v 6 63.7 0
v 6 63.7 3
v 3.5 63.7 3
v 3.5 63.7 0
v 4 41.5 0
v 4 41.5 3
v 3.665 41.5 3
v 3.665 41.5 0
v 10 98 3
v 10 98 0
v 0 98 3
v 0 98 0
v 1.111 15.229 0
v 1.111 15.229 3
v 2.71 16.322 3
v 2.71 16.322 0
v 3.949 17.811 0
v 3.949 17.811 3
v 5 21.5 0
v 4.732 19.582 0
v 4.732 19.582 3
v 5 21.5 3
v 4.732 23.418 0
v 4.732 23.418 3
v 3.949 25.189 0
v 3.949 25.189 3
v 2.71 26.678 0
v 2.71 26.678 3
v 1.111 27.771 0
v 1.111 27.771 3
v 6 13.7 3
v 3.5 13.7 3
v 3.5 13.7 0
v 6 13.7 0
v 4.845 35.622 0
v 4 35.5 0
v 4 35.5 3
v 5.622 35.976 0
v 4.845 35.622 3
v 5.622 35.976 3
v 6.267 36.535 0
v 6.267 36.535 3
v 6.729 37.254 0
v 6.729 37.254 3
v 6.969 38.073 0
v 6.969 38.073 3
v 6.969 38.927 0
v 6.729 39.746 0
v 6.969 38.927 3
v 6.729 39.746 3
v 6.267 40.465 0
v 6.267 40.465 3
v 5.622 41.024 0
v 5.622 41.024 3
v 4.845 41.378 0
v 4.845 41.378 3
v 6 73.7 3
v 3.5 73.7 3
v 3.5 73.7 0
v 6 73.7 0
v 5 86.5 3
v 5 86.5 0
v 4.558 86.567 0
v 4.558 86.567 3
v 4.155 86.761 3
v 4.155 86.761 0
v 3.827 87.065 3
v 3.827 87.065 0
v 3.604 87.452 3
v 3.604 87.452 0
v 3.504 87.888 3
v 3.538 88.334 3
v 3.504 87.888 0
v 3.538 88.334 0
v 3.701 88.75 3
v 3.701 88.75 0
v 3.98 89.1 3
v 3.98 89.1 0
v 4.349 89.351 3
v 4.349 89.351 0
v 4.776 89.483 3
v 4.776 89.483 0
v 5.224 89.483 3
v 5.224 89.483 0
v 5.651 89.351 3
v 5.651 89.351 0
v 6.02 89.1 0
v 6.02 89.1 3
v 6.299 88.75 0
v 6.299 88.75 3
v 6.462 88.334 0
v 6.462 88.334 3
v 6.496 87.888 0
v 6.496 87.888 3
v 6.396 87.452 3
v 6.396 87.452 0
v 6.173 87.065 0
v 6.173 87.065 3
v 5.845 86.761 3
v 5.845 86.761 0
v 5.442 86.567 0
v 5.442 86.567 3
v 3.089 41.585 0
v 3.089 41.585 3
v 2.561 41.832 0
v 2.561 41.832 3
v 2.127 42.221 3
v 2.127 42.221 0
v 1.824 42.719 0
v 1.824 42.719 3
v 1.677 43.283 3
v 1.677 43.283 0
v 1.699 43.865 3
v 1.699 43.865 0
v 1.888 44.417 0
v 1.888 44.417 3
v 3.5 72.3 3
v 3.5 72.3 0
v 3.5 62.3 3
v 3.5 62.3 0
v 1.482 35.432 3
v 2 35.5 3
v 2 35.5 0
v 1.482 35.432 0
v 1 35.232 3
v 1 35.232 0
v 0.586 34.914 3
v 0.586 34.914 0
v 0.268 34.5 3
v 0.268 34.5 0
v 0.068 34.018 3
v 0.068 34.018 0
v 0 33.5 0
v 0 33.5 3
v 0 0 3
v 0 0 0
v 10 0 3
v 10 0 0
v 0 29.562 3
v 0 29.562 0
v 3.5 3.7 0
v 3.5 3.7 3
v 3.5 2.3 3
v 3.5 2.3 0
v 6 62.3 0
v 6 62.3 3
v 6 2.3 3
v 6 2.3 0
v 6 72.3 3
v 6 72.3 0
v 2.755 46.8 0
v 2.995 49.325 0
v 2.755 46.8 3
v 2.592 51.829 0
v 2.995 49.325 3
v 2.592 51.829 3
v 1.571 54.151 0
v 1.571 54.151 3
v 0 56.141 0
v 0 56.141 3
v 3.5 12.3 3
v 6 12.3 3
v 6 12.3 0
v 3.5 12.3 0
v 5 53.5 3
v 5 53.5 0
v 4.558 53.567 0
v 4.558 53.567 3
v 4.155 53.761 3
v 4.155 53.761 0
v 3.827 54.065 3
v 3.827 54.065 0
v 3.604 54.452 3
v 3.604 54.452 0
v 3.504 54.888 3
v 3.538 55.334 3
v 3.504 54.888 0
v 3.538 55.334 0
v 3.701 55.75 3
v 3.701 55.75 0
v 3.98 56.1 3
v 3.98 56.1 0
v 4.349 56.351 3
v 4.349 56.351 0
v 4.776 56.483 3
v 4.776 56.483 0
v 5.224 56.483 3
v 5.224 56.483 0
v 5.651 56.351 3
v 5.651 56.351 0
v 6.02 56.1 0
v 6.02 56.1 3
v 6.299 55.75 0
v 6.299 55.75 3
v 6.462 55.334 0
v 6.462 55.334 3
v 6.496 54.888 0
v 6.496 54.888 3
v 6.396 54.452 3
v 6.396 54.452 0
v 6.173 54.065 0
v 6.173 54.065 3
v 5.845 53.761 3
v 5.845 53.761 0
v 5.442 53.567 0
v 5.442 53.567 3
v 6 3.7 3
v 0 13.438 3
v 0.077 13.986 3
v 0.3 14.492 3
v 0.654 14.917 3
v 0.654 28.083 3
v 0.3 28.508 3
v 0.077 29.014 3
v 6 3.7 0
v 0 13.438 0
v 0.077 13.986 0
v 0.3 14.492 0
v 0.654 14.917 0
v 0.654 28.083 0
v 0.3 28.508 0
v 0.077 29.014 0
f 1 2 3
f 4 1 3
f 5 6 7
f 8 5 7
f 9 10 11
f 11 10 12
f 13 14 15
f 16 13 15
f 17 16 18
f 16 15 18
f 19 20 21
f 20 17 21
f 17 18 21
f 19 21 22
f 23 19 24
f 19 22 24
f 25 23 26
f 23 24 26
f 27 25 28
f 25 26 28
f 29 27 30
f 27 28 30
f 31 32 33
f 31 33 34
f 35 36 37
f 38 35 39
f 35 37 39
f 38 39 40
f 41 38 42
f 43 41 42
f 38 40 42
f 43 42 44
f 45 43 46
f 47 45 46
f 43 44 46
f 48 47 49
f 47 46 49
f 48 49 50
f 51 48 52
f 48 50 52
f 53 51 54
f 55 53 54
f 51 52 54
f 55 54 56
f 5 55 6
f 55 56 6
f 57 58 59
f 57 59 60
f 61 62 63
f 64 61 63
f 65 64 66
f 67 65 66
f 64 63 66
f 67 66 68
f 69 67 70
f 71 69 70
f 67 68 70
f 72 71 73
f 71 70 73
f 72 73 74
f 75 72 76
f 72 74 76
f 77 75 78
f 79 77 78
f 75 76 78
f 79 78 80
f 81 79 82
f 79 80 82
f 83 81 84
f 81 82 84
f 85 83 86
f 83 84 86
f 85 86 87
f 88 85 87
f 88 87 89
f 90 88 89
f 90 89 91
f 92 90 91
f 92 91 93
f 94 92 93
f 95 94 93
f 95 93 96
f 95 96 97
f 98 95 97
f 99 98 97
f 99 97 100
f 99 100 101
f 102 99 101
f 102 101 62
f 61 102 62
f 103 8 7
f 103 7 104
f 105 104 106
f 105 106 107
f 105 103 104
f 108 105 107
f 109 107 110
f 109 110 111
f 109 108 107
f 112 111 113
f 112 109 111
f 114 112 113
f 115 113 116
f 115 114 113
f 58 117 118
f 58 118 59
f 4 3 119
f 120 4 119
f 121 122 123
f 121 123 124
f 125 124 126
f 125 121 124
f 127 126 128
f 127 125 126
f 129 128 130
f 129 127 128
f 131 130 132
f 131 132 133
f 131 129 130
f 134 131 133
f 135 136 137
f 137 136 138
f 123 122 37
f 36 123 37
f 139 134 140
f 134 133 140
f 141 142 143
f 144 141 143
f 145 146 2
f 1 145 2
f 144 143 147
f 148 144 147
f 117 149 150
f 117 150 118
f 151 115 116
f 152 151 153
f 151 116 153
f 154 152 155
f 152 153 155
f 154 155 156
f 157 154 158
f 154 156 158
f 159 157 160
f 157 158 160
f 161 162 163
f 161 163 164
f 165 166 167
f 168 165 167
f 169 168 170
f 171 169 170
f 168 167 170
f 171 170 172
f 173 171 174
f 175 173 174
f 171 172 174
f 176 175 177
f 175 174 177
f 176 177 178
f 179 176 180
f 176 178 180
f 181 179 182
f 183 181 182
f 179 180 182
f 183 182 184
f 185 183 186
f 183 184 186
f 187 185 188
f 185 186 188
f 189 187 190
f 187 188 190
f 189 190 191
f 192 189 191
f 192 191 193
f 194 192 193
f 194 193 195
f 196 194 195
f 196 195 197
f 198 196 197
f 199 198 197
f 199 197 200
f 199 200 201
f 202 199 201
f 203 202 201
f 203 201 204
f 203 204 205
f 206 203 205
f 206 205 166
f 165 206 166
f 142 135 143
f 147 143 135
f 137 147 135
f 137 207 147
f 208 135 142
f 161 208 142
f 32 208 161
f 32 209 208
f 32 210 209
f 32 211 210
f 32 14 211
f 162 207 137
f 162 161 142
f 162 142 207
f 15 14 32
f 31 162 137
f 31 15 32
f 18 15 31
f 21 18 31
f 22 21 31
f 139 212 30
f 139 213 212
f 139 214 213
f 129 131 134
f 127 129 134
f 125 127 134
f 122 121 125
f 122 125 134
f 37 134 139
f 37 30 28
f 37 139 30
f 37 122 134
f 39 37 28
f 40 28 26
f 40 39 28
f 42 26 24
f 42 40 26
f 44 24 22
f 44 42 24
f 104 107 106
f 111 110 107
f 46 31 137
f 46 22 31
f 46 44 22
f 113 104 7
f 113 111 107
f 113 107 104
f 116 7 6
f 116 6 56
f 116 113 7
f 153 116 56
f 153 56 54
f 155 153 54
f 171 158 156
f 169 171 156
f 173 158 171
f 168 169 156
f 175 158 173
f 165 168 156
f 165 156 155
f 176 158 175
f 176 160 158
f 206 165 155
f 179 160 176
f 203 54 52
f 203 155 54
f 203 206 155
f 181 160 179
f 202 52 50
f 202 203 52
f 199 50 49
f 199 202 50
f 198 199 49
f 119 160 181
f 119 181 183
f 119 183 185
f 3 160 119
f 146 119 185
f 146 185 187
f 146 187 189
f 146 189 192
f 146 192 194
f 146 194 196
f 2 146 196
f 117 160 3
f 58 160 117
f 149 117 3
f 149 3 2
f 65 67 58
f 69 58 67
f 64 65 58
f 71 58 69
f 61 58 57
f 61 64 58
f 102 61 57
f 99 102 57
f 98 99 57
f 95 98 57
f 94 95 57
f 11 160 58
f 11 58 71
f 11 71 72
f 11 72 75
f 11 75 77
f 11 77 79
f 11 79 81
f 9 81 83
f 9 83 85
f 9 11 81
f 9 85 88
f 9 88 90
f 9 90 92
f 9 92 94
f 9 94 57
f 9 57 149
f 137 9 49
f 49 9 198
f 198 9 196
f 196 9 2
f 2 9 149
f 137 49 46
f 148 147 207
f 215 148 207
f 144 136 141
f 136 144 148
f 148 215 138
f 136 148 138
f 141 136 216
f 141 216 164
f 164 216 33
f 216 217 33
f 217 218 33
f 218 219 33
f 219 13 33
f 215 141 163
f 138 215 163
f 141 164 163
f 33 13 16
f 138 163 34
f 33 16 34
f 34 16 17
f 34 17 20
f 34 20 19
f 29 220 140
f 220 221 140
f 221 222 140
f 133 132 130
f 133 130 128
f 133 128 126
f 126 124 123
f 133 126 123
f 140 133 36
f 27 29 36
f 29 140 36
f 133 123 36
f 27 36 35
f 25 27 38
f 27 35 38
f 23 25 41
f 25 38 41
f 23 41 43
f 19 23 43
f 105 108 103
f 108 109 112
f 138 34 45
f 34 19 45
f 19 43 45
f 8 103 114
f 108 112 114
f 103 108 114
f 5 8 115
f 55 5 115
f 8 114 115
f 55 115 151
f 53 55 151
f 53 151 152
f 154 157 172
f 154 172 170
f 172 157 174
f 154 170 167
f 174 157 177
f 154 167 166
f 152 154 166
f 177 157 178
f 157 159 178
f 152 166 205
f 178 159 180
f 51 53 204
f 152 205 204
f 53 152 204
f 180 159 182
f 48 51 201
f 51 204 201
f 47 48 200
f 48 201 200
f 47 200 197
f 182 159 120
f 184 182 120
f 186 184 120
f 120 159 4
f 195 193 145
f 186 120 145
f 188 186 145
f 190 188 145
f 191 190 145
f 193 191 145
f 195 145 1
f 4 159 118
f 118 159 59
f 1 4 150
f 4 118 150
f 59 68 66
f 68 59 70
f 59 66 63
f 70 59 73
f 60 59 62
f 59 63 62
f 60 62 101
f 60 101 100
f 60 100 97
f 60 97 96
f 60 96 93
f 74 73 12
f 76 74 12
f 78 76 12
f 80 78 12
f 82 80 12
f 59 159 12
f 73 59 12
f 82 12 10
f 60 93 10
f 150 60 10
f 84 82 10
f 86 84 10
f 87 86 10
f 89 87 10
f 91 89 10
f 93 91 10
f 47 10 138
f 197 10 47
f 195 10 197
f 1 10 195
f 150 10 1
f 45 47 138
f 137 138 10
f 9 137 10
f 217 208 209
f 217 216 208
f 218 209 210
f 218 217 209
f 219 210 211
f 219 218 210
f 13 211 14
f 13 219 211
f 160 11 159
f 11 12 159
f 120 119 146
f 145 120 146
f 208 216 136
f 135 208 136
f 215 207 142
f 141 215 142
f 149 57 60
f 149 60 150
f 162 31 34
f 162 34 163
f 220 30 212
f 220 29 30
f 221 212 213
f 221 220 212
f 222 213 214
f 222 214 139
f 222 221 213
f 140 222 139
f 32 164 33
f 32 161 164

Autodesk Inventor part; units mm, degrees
ref_plane "YZ Plane" through (0, 0, 0) normal (1, 0, 0) x (0, 1, 0)
ref_plane "XZ Plane" through (0, 0, 0) normal (0, 1, 0) x (-1, 0, 0)
ref_plane "XY Plane" through (0, 0, 0) normal (0, 0, 1) x (1, 0, 0)
sketch "Sketch1" plane through (0, 0, 0) normal (0, 0, 1) x (1, 0, 0)
  line L0 (0, 0) -> (10, 0)
  line L1 (10, 0) -> (10, 98)
  line L2 (10, 98) -> (0, 98)
  line L3 (0, 98) -> (0, 0)
  line L4 (0, 9.7325) -> (6, 9.7325)
  line L5 (6, 9.7325) -> (6, 6.2675)
  line L6 (6, 6.2675) -> (0, 6.2675)
  line L7 (0, 6.2675) -> (0, 9.7325)
  line L8 (0, 69.7325) -> (6, 69.7325)
  line L9 (6, 69.7325) -> (6, 66.2675)
  line L10 (6, 66.2675) -> (0, 66.2675)
  line L11 (0, 66.2675) -> (0, 69.7325)
  dimension "d0" = 10
  dimension "d1" = 98
  dimension "d10" = 6.2675
  dimension "d11" = 3.465
  dimension "d12" = 6
  dimension "d13" = 3.465
  dimension "d14" = 28.2675
  dimension "d15" = 6
extrude "Extrusion1" add sketch "Sketch1" along normal blind 3
sketch "Sketch2" plane through (0, 0, 3) normal (0, 0, 1) x (1, 0, 0)
  line L0 (10, 0) -> (0, 0) projected
  line L1 (10, 98) -> (10, 0) projected
  line L2 (0, 98) -> (10, 98) projected
  line L3 (6, 3.7) -> (3.5, 3.7)
  line L4 (3.5, 3.7) -> (3.5, 2.3)
  line L5 (3.5, 2.3) -> (6, 2.3)
  line L6 (6, 2.3) -> (6, 3.7)
  line L7 (6, 12.3) -> (3.5, 12.3)
  line L8 (3.5, 12.3) -> (3.5, 13.7)
  line L9 (3.5, 13.7) -> (6, 13.7)
  line L10 (6, 13.7) -> (6, 12.3)
  line L11 (6, 63.7) -> (3.5, 63.7)
  line L12 (3.5, 63.7) -> (3.5, 62.3)
  line L13 (3.5, 62.3) -> (6, 62.3)
  line L14 (6, 62.3) -> (6, 63.7)
  line L15 (6, 72.3) -> (3.5, 72.3)
  line L16 (3.5, 72.3) -> (3.5, 73.7)
  line L17 (3.5, 73.7) -> (6, 73.7)
  line L18 (6, 73.7) -> (6, 72.3)
  dimension "d16" = 1.4
  dimension "d17" = 2.5
  dimension "d18" = 2.3
  dimension "d19" = 1.4
  dimension "d20" = 8.6
  dimension "d21" = 2.5
  dimension "d22" = 4
  dimension "d23" = 1.4
  dimension "d24" = 1.4
  dimension "d25" = 2.5
  dimension "d26" = 24.3
  dimension "d27" = 8.6
extrude "Extrusion2" cut sketch "Sketch2" against normal through all
sketch "草圖7" plane through (0, 0, 3) normal (0, 0, 1) x (1, 0, 0)
  line L0 (0, 98) -> (10, 98) projected
  point P0 (5, 88)
  point P1 (5, 55)
  dimension "d67" = 10
  dimension "d68" = 43
hole "孔4" at (5, 88, 3) at (5, 55, 3) direction (0, 0, -1) diameter 3 end through all
sketch "草圖8" plane through (0, 0, 3) normal (0, 0, 1) x (1, 0, 0)
  line L0 (0, 0) -> (0, 98) projected
  line L1 (10, 0) -> (0, 0) projected
  line L2 (10, 98) -> (10, 0) projected
  line L3 (0, 98) -> (10, 98) projected
  circle A0 centre (-7, 49) radius 10
  circle A1 centre (-2, 21.5) radius 7
  circle A2 centre (4, 38.5) radius 3
  line L4 (4, 41.5) -> (0, 41.5)
  line L5 (0, 41.5) -> (0, 35.5)
  line L6 (0, 35.5) -> (4, 35.5)
  line L7 (4, 35.5) -> (4, 41.5)
  point P0 (0, 66.2675)
  point P1 (0, 9.7325)
  dimension "d84" = 6
  dimension "d76" = 49
  dimension "d77" = 7
  dimension "d78" = 20
  dimension "d79" = 12
  dimension "d80" = 21.5
  dimension "d81" = 14
  dimension "d82" = 38.5
  dimension "d83" = 6
extrude "擠出4" cut sketch "草圖8" against normal through all contours L0 L4 A2 L6 | A1 L0 | L0 A1 | L7 A2 | A2 L7 | A0 L0 | L0 A0
fillet "圓角4" radius 2 5 edges at (0, 14.7918, 1.5) (0, 28.2082, 1.5) (0, 35.5, 1.5) (0, 41.5, 1.5) (0, 41.8586, 1.5)
properties part number "plastic_part_53"
